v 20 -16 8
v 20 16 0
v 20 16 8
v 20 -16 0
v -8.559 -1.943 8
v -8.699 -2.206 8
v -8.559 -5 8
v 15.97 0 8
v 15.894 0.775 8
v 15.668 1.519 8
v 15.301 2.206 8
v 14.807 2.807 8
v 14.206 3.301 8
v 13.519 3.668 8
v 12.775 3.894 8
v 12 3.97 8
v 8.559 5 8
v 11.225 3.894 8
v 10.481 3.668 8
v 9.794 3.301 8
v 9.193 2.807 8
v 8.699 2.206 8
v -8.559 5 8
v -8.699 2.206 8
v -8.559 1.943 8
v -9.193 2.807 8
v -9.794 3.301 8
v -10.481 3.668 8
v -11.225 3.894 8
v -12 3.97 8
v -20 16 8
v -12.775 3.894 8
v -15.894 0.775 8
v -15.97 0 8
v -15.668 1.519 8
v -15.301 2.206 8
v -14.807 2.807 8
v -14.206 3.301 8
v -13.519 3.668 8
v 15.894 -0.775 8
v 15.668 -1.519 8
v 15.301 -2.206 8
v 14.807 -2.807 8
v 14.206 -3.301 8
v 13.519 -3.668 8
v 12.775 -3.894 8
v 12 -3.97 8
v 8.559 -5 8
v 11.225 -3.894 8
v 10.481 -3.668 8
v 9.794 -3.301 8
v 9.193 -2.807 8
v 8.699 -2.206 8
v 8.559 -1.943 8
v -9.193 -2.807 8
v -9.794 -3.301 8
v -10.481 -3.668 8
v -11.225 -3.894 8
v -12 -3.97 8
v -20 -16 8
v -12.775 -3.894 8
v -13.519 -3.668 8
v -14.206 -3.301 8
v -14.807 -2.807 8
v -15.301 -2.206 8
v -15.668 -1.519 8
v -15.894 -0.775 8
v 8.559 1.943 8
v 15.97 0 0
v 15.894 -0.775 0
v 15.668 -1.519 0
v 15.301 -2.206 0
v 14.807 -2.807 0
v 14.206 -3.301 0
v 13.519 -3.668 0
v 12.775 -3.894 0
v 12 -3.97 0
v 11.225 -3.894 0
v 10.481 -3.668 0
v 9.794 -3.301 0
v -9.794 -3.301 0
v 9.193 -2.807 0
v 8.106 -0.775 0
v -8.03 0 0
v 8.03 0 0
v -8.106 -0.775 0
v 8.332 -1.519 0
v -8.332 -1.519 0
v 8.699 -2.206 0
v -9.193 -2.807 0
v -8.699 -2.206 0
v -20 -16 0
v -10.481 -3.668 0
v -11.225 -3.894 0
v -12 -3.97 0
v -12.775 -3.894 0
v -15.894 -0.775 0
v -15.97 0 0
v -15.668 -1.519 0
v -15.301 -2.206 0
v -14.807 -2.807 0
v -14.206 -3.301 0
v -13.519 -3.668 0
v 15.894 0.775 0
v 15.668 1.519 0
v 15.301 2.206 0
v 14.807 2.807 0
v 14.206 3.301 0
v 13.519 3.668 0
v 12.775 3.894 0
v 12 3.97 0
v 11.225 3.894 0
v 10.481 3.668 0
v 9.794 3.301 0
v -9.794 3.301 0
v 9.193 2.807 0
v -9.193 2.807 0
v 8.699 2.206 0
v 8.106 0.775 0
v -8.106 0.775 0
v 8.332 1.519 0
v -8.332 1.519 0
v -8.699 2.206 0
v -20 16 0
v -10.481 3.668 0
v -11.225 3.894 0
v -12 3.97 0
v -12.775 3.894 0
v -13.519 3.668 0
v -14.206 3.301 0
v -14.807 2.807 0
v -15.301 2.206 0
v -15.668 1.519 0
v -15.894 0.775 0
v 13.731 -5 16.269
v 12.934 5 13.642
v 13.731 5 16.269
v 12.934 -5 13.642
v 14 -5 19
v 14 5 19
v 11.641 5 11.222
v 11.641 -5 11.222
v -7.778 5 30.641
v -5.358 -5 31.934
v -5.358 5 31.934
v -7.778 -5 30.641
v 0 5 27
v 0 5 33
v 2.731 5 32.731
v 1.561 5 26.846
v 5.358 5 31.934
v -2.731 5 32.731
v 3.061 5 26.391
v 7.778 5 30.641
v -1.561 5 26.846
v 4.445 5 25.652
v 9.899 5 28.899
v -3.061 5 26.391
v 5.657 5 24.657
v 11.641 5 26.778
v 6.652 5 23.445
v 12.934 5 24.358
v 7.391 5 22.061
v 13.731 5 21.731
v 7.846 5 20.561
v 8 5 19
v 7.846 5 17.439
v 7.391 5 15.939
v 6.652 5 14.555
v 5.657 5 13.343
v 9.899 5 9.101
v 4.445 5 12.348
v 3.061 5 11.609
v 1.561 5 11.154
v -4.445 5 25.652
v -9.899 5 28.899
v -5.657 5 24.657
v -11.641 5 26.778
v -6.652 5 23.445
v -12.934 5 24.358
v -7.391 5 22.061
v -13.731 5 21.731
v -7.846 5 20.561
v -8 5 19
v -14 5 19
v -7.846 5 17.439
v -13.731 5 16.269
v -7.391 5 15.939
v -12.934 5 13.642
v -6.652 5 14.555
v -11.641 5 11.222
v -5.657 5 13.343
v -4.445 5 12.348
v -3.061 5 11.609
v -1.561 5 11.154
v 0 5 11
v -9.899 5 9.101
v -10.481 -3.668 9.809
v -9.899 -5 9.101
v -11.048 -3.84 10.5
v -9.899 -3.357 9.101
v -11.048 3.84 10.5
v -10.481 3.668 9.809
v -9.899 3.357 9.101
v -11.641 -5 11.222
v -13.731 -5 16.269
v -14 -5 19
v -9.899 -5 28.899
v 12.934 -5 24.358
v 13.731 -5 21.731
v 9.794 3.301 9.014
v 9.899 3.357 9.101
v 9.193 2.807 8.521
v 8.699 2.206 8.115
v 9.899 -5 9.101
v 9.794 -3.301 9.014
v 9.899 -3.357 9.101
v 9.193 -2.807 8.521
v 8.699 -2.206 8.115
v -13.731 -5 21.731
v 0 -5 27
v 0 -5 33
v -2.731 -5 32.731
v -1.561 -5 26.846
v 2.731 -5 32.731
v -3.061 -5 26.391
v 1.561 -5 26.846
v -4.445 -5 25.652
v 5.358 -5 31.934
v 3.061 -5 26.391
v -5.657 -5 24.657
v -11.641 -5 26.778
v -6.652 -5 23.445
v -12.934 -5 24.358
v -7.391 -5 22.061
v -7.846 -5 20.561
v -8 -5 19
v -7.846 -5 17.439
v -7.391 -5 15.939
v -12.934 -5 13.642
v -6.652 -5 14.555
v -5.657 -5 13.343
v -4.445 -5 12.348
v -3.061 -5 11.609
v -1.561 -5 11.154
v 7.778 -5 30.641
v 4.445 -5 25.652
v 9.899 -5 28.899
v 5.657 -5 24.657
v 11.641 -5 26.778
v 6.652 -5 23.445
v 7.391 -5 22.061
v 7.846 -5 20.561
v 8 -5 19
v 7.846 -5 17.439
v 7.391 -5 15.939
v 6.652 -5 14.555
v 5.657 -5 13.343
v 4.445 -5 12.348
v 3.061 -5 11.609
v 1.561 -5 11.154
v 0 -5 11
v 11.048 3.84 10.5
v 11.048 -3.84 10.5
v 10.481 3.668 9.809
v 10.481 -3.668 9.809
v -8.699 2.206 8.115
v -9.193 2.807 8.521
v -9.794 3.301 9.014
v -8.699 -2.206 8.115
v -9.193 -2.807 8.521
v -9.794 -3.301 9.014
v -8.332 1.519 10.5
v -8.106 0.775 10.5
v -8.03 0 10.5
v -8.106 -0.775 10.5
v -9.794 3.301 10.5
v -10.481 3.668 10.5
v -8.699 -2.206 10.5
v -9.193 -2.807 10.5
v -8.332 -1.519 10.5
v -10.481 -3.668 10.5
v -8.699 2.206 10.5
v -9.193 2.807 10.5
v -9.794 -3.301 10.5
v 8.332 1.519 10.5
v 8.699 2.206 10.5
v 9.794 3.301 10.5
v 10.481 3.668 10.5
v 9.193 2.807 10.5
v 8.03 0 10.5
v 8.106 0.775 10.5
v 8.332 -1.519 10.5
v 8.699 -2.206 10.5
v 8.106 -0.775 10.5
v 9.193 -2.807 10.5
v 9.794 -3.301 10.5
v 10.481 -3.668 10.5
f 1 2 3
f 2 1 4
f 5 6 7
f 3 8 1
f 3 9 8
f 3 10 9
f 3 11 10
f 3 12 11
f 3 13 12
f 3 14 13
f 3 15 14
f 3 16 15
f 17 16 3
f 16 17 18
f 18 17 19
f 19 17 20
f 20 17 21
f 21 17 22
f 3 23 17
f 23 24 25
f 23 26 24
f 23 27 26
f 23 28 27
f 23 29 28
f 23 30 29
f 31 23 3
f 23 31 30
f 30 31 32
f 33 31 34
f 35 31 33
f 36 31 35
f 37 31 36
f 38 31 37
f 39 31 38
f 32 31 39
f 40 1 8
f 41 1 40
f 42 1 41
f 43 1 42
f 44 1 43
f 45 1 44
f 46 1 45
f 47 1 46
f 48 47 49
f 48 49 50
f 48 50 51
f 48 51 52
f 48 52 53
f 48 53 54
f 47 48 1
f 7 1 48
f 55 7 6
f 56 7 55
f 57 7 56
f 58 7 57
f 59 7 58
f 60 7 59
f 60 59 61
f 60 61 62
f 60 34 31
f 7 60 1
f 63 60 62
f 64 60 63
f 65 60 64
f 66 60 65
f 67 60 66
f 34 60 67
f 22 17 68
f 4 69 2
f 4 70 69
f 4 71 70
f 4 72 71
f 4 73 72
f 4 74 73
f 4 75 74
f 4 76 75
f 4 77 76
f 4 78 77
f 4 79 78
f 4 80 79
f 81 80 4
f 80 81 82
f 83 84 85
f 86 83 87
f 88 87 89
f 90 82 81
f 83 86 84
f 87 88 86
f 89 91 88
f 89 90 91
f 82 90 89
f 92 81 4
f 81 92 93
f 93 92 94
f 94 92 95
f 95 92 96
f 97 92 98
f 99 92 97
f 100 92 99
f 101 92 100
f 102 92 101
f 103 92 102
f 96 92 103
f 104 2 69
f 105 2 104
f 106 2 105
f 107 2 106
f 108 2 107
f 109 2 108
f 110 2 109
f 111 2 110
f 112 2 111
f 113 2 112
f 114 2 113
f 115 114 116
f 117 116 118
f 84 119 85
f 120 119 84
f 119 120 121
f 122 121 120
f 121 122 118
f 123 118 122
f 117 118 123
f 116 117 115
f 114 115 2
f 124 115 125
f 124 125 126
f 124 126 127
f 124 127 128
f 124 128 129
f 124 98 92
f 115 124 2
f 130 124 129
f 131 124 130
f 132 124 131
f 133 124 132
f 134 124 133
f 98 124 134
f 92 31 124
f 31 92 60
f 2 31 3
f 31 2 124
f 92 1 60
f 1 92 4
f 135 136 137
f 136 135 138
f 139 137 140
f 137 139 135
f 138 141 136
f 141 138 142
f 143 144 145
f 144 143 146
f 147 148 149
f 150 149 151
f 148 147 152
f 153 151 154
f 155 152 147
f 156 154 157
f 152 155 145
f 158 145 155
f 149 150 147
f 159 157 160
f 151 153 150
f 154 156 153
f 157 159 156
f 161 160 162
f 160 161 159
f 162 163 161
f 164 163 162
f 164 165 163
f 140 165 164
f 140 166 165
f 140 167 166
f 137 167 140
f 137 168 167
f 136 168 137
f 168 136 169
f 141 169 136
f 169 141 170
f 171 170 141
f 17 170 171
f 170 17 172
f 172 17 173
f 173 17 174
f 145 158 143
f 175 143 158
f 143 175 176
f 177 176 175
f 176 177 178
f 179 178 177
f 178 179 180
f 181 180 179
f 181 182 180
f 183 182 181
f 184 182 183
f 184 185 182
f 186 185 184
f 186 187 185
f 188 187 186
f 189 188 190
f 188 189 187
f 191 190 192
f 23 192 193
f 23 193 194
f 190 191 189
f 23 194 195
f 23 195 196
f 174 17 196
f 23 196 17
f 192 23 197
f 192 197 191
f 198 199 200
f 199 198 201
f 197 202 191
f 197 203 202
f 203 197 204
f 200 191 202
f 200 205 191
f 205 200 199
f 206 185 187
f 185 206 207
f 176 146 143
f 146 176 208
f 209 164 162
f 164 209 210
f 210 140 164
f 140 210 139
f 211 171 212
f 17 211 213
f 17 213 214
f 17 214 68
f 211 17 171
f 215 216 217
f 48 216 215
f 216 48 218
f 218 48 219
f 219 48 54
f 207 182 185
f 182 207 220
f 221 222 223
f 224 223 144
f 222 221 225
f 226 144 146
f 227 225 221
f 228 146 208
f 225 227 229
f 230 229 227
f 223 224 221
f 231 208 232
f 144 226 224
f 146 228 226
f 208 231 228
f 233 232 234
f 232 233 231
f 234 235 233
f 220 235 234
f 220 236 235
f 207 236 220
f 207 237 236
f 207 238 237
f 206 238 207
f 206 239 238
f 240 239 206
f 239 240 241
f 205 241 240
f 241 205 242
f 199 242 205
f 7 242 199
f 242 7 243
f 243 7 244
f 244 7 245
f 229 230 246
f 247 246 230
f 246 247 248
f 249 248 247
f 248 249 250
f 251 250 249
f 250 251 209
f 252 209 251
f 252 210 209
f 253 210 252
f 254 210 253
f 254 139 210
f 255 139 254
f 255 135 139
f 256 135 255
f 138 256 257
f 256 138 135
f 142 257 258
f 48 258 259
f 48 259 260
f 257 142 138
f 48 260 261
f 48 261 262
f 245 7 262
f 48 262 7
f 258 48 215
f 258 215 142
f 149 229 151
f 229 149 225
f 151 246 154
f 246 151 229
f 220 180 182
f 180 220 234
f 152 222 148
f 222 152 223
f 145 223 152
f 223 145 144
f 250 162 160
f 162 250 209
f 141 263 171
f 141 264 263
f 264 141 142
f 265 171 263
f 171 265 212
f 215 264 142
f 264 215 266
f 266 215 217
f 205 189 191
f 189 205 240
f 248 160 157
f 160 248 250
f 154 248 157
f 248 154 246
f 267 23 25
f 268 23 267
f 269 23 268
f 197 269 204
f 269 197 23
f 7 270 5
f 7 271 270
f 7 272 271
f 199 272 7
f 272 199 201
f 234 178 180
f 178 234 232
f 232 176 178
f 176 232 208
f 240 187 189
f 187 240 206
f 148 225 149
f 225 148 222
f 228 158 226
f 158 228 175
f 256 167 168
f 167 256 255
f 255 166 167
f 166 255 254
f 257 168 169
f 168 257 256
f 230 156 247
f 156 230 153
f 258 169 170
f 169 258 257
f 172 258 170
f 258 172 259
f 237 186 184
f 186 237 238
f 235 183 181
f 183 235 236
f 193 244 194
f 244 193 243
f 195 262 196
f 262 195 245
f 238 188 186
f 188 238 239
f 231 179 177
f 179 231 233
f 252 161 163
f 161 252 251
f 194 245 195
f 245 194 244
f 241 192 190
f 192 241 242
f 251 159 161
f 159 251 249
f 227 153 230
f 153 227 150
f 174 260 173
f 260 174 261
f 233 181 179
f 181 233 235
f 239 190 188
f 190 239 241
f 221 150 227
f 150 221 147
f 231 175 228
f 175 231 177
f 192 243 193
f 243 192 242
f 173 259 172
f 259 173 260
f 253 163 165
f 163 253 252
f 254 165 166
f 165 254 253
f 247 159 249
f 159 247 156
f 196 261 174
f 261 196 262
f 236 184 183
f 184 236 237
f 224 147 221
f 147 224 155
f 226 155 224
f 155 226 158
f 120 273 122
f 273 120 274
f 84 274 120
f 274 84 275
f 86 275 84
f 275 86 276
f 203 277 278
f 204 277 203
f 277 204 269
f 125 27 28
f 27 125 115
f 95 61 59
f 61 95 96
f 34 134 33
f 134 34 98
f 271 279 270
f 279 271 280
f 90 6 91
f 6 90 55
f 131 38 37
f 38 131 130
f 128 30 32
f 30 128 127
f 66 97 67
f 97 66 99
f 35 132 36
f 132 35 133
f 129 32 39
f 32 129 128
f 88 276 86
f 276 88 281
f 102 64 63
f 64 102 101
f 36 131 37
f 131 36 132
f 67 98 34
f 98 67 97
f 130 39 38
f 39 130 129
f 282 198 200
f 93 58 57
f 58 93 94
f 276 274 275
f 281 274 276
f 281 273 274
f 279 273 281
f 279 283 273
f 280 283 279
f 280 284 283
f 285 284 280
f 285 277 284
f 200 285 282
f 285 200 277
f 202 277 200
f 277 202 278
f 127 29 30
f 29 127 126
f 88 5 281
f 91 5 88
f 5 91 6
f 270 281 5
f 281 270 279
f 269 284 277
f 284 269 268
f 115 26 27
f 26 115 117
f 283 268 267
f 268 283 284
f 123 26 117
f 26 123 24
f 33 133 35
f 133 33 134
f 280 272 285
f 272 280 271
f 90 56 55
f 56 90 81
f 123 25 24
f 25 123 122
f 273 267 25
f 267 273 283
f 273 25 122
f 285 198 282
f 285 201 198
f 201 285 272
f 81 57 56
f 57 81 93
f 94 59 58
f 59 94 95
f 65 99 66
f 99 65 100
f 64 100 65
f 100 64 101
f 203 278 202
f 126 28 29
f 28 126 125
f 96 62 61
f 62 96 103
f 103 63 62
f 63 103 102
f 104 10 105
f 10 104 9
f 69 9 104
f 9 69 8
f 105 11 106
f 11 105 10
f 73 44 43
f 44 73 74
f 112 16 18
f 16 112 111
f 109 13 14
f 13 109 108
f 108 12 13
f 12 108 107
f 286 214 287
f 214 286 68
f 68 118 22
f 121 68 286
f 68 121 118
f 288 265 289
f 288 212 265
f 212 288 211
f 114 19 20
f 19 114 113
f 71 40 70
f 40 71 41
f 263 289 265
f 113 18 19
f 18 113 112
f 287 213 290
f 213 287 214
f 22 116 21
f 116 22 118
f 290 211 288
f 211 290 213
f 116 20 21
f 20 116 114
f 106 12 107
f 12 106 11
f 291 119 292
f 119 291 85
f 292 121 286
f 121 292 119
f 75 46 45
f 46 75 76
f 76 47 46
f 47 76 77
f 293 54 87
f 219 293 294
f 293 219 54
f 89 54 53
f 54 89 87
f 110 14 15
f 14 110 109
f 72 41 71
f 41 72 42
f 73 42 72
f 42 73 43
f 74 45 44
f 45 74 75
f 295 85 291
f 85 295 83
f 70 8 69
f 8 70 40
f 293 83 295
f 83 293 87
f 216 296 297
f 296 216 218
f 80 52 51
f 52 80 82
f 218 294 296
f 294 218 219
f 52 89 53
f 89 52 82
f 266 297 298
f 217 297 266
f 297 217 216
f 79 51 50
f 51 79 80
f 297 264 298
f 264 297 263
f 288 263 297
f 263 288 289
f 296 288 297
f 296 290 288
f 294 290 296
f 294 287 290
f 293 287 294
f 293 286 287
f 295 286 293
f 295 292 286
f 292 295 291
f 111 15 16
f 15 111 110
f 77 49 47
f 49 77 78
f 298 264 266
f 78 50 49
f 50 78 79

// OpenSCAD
$fn = 32;

// ----------------------------------------------------------------------
// Deck eye: 28 mm eye on a 40 mm base
// ----------------------------------------------------------------------

// --- parameters (mm) ---
base_l = 40;              // base length
base_w = 32;              // base width
base_t = 8;               // base thickness
eye_r = 14;               // eye outside radius
eye_bore = 16;            // eye bore diameter
eye_w = 10;               // eye thickness
eye_z = 19;               // eye centre height
holes_d = 7.94;           // fixing holes
hole_x = 12;              // fixing hole spacing

difference() {
  union() {
    translate([-20, -16, 0]) cube([base_l, base_w, base_t]);
    /* eye standing upright, its foot sunk 3 mm into the base */
    translate([0, -5, 19]) rotate([-90, 0, 0]) cylinder(h = 10, d = 28);
  }
  /* eye bore, 2.5 mm clear of both faces */
  translate([0, -7.5, 19]) rotate([-90, 0, 0]) cylinder(h = 15, d = 16);
  translate([-12, 0, -2.5]) cylinder(h = base_t + 5, d = holes_d);
  translate([12, 0, -2.5]) cylinder(h = base_t + 5, d = holes_d);
}
